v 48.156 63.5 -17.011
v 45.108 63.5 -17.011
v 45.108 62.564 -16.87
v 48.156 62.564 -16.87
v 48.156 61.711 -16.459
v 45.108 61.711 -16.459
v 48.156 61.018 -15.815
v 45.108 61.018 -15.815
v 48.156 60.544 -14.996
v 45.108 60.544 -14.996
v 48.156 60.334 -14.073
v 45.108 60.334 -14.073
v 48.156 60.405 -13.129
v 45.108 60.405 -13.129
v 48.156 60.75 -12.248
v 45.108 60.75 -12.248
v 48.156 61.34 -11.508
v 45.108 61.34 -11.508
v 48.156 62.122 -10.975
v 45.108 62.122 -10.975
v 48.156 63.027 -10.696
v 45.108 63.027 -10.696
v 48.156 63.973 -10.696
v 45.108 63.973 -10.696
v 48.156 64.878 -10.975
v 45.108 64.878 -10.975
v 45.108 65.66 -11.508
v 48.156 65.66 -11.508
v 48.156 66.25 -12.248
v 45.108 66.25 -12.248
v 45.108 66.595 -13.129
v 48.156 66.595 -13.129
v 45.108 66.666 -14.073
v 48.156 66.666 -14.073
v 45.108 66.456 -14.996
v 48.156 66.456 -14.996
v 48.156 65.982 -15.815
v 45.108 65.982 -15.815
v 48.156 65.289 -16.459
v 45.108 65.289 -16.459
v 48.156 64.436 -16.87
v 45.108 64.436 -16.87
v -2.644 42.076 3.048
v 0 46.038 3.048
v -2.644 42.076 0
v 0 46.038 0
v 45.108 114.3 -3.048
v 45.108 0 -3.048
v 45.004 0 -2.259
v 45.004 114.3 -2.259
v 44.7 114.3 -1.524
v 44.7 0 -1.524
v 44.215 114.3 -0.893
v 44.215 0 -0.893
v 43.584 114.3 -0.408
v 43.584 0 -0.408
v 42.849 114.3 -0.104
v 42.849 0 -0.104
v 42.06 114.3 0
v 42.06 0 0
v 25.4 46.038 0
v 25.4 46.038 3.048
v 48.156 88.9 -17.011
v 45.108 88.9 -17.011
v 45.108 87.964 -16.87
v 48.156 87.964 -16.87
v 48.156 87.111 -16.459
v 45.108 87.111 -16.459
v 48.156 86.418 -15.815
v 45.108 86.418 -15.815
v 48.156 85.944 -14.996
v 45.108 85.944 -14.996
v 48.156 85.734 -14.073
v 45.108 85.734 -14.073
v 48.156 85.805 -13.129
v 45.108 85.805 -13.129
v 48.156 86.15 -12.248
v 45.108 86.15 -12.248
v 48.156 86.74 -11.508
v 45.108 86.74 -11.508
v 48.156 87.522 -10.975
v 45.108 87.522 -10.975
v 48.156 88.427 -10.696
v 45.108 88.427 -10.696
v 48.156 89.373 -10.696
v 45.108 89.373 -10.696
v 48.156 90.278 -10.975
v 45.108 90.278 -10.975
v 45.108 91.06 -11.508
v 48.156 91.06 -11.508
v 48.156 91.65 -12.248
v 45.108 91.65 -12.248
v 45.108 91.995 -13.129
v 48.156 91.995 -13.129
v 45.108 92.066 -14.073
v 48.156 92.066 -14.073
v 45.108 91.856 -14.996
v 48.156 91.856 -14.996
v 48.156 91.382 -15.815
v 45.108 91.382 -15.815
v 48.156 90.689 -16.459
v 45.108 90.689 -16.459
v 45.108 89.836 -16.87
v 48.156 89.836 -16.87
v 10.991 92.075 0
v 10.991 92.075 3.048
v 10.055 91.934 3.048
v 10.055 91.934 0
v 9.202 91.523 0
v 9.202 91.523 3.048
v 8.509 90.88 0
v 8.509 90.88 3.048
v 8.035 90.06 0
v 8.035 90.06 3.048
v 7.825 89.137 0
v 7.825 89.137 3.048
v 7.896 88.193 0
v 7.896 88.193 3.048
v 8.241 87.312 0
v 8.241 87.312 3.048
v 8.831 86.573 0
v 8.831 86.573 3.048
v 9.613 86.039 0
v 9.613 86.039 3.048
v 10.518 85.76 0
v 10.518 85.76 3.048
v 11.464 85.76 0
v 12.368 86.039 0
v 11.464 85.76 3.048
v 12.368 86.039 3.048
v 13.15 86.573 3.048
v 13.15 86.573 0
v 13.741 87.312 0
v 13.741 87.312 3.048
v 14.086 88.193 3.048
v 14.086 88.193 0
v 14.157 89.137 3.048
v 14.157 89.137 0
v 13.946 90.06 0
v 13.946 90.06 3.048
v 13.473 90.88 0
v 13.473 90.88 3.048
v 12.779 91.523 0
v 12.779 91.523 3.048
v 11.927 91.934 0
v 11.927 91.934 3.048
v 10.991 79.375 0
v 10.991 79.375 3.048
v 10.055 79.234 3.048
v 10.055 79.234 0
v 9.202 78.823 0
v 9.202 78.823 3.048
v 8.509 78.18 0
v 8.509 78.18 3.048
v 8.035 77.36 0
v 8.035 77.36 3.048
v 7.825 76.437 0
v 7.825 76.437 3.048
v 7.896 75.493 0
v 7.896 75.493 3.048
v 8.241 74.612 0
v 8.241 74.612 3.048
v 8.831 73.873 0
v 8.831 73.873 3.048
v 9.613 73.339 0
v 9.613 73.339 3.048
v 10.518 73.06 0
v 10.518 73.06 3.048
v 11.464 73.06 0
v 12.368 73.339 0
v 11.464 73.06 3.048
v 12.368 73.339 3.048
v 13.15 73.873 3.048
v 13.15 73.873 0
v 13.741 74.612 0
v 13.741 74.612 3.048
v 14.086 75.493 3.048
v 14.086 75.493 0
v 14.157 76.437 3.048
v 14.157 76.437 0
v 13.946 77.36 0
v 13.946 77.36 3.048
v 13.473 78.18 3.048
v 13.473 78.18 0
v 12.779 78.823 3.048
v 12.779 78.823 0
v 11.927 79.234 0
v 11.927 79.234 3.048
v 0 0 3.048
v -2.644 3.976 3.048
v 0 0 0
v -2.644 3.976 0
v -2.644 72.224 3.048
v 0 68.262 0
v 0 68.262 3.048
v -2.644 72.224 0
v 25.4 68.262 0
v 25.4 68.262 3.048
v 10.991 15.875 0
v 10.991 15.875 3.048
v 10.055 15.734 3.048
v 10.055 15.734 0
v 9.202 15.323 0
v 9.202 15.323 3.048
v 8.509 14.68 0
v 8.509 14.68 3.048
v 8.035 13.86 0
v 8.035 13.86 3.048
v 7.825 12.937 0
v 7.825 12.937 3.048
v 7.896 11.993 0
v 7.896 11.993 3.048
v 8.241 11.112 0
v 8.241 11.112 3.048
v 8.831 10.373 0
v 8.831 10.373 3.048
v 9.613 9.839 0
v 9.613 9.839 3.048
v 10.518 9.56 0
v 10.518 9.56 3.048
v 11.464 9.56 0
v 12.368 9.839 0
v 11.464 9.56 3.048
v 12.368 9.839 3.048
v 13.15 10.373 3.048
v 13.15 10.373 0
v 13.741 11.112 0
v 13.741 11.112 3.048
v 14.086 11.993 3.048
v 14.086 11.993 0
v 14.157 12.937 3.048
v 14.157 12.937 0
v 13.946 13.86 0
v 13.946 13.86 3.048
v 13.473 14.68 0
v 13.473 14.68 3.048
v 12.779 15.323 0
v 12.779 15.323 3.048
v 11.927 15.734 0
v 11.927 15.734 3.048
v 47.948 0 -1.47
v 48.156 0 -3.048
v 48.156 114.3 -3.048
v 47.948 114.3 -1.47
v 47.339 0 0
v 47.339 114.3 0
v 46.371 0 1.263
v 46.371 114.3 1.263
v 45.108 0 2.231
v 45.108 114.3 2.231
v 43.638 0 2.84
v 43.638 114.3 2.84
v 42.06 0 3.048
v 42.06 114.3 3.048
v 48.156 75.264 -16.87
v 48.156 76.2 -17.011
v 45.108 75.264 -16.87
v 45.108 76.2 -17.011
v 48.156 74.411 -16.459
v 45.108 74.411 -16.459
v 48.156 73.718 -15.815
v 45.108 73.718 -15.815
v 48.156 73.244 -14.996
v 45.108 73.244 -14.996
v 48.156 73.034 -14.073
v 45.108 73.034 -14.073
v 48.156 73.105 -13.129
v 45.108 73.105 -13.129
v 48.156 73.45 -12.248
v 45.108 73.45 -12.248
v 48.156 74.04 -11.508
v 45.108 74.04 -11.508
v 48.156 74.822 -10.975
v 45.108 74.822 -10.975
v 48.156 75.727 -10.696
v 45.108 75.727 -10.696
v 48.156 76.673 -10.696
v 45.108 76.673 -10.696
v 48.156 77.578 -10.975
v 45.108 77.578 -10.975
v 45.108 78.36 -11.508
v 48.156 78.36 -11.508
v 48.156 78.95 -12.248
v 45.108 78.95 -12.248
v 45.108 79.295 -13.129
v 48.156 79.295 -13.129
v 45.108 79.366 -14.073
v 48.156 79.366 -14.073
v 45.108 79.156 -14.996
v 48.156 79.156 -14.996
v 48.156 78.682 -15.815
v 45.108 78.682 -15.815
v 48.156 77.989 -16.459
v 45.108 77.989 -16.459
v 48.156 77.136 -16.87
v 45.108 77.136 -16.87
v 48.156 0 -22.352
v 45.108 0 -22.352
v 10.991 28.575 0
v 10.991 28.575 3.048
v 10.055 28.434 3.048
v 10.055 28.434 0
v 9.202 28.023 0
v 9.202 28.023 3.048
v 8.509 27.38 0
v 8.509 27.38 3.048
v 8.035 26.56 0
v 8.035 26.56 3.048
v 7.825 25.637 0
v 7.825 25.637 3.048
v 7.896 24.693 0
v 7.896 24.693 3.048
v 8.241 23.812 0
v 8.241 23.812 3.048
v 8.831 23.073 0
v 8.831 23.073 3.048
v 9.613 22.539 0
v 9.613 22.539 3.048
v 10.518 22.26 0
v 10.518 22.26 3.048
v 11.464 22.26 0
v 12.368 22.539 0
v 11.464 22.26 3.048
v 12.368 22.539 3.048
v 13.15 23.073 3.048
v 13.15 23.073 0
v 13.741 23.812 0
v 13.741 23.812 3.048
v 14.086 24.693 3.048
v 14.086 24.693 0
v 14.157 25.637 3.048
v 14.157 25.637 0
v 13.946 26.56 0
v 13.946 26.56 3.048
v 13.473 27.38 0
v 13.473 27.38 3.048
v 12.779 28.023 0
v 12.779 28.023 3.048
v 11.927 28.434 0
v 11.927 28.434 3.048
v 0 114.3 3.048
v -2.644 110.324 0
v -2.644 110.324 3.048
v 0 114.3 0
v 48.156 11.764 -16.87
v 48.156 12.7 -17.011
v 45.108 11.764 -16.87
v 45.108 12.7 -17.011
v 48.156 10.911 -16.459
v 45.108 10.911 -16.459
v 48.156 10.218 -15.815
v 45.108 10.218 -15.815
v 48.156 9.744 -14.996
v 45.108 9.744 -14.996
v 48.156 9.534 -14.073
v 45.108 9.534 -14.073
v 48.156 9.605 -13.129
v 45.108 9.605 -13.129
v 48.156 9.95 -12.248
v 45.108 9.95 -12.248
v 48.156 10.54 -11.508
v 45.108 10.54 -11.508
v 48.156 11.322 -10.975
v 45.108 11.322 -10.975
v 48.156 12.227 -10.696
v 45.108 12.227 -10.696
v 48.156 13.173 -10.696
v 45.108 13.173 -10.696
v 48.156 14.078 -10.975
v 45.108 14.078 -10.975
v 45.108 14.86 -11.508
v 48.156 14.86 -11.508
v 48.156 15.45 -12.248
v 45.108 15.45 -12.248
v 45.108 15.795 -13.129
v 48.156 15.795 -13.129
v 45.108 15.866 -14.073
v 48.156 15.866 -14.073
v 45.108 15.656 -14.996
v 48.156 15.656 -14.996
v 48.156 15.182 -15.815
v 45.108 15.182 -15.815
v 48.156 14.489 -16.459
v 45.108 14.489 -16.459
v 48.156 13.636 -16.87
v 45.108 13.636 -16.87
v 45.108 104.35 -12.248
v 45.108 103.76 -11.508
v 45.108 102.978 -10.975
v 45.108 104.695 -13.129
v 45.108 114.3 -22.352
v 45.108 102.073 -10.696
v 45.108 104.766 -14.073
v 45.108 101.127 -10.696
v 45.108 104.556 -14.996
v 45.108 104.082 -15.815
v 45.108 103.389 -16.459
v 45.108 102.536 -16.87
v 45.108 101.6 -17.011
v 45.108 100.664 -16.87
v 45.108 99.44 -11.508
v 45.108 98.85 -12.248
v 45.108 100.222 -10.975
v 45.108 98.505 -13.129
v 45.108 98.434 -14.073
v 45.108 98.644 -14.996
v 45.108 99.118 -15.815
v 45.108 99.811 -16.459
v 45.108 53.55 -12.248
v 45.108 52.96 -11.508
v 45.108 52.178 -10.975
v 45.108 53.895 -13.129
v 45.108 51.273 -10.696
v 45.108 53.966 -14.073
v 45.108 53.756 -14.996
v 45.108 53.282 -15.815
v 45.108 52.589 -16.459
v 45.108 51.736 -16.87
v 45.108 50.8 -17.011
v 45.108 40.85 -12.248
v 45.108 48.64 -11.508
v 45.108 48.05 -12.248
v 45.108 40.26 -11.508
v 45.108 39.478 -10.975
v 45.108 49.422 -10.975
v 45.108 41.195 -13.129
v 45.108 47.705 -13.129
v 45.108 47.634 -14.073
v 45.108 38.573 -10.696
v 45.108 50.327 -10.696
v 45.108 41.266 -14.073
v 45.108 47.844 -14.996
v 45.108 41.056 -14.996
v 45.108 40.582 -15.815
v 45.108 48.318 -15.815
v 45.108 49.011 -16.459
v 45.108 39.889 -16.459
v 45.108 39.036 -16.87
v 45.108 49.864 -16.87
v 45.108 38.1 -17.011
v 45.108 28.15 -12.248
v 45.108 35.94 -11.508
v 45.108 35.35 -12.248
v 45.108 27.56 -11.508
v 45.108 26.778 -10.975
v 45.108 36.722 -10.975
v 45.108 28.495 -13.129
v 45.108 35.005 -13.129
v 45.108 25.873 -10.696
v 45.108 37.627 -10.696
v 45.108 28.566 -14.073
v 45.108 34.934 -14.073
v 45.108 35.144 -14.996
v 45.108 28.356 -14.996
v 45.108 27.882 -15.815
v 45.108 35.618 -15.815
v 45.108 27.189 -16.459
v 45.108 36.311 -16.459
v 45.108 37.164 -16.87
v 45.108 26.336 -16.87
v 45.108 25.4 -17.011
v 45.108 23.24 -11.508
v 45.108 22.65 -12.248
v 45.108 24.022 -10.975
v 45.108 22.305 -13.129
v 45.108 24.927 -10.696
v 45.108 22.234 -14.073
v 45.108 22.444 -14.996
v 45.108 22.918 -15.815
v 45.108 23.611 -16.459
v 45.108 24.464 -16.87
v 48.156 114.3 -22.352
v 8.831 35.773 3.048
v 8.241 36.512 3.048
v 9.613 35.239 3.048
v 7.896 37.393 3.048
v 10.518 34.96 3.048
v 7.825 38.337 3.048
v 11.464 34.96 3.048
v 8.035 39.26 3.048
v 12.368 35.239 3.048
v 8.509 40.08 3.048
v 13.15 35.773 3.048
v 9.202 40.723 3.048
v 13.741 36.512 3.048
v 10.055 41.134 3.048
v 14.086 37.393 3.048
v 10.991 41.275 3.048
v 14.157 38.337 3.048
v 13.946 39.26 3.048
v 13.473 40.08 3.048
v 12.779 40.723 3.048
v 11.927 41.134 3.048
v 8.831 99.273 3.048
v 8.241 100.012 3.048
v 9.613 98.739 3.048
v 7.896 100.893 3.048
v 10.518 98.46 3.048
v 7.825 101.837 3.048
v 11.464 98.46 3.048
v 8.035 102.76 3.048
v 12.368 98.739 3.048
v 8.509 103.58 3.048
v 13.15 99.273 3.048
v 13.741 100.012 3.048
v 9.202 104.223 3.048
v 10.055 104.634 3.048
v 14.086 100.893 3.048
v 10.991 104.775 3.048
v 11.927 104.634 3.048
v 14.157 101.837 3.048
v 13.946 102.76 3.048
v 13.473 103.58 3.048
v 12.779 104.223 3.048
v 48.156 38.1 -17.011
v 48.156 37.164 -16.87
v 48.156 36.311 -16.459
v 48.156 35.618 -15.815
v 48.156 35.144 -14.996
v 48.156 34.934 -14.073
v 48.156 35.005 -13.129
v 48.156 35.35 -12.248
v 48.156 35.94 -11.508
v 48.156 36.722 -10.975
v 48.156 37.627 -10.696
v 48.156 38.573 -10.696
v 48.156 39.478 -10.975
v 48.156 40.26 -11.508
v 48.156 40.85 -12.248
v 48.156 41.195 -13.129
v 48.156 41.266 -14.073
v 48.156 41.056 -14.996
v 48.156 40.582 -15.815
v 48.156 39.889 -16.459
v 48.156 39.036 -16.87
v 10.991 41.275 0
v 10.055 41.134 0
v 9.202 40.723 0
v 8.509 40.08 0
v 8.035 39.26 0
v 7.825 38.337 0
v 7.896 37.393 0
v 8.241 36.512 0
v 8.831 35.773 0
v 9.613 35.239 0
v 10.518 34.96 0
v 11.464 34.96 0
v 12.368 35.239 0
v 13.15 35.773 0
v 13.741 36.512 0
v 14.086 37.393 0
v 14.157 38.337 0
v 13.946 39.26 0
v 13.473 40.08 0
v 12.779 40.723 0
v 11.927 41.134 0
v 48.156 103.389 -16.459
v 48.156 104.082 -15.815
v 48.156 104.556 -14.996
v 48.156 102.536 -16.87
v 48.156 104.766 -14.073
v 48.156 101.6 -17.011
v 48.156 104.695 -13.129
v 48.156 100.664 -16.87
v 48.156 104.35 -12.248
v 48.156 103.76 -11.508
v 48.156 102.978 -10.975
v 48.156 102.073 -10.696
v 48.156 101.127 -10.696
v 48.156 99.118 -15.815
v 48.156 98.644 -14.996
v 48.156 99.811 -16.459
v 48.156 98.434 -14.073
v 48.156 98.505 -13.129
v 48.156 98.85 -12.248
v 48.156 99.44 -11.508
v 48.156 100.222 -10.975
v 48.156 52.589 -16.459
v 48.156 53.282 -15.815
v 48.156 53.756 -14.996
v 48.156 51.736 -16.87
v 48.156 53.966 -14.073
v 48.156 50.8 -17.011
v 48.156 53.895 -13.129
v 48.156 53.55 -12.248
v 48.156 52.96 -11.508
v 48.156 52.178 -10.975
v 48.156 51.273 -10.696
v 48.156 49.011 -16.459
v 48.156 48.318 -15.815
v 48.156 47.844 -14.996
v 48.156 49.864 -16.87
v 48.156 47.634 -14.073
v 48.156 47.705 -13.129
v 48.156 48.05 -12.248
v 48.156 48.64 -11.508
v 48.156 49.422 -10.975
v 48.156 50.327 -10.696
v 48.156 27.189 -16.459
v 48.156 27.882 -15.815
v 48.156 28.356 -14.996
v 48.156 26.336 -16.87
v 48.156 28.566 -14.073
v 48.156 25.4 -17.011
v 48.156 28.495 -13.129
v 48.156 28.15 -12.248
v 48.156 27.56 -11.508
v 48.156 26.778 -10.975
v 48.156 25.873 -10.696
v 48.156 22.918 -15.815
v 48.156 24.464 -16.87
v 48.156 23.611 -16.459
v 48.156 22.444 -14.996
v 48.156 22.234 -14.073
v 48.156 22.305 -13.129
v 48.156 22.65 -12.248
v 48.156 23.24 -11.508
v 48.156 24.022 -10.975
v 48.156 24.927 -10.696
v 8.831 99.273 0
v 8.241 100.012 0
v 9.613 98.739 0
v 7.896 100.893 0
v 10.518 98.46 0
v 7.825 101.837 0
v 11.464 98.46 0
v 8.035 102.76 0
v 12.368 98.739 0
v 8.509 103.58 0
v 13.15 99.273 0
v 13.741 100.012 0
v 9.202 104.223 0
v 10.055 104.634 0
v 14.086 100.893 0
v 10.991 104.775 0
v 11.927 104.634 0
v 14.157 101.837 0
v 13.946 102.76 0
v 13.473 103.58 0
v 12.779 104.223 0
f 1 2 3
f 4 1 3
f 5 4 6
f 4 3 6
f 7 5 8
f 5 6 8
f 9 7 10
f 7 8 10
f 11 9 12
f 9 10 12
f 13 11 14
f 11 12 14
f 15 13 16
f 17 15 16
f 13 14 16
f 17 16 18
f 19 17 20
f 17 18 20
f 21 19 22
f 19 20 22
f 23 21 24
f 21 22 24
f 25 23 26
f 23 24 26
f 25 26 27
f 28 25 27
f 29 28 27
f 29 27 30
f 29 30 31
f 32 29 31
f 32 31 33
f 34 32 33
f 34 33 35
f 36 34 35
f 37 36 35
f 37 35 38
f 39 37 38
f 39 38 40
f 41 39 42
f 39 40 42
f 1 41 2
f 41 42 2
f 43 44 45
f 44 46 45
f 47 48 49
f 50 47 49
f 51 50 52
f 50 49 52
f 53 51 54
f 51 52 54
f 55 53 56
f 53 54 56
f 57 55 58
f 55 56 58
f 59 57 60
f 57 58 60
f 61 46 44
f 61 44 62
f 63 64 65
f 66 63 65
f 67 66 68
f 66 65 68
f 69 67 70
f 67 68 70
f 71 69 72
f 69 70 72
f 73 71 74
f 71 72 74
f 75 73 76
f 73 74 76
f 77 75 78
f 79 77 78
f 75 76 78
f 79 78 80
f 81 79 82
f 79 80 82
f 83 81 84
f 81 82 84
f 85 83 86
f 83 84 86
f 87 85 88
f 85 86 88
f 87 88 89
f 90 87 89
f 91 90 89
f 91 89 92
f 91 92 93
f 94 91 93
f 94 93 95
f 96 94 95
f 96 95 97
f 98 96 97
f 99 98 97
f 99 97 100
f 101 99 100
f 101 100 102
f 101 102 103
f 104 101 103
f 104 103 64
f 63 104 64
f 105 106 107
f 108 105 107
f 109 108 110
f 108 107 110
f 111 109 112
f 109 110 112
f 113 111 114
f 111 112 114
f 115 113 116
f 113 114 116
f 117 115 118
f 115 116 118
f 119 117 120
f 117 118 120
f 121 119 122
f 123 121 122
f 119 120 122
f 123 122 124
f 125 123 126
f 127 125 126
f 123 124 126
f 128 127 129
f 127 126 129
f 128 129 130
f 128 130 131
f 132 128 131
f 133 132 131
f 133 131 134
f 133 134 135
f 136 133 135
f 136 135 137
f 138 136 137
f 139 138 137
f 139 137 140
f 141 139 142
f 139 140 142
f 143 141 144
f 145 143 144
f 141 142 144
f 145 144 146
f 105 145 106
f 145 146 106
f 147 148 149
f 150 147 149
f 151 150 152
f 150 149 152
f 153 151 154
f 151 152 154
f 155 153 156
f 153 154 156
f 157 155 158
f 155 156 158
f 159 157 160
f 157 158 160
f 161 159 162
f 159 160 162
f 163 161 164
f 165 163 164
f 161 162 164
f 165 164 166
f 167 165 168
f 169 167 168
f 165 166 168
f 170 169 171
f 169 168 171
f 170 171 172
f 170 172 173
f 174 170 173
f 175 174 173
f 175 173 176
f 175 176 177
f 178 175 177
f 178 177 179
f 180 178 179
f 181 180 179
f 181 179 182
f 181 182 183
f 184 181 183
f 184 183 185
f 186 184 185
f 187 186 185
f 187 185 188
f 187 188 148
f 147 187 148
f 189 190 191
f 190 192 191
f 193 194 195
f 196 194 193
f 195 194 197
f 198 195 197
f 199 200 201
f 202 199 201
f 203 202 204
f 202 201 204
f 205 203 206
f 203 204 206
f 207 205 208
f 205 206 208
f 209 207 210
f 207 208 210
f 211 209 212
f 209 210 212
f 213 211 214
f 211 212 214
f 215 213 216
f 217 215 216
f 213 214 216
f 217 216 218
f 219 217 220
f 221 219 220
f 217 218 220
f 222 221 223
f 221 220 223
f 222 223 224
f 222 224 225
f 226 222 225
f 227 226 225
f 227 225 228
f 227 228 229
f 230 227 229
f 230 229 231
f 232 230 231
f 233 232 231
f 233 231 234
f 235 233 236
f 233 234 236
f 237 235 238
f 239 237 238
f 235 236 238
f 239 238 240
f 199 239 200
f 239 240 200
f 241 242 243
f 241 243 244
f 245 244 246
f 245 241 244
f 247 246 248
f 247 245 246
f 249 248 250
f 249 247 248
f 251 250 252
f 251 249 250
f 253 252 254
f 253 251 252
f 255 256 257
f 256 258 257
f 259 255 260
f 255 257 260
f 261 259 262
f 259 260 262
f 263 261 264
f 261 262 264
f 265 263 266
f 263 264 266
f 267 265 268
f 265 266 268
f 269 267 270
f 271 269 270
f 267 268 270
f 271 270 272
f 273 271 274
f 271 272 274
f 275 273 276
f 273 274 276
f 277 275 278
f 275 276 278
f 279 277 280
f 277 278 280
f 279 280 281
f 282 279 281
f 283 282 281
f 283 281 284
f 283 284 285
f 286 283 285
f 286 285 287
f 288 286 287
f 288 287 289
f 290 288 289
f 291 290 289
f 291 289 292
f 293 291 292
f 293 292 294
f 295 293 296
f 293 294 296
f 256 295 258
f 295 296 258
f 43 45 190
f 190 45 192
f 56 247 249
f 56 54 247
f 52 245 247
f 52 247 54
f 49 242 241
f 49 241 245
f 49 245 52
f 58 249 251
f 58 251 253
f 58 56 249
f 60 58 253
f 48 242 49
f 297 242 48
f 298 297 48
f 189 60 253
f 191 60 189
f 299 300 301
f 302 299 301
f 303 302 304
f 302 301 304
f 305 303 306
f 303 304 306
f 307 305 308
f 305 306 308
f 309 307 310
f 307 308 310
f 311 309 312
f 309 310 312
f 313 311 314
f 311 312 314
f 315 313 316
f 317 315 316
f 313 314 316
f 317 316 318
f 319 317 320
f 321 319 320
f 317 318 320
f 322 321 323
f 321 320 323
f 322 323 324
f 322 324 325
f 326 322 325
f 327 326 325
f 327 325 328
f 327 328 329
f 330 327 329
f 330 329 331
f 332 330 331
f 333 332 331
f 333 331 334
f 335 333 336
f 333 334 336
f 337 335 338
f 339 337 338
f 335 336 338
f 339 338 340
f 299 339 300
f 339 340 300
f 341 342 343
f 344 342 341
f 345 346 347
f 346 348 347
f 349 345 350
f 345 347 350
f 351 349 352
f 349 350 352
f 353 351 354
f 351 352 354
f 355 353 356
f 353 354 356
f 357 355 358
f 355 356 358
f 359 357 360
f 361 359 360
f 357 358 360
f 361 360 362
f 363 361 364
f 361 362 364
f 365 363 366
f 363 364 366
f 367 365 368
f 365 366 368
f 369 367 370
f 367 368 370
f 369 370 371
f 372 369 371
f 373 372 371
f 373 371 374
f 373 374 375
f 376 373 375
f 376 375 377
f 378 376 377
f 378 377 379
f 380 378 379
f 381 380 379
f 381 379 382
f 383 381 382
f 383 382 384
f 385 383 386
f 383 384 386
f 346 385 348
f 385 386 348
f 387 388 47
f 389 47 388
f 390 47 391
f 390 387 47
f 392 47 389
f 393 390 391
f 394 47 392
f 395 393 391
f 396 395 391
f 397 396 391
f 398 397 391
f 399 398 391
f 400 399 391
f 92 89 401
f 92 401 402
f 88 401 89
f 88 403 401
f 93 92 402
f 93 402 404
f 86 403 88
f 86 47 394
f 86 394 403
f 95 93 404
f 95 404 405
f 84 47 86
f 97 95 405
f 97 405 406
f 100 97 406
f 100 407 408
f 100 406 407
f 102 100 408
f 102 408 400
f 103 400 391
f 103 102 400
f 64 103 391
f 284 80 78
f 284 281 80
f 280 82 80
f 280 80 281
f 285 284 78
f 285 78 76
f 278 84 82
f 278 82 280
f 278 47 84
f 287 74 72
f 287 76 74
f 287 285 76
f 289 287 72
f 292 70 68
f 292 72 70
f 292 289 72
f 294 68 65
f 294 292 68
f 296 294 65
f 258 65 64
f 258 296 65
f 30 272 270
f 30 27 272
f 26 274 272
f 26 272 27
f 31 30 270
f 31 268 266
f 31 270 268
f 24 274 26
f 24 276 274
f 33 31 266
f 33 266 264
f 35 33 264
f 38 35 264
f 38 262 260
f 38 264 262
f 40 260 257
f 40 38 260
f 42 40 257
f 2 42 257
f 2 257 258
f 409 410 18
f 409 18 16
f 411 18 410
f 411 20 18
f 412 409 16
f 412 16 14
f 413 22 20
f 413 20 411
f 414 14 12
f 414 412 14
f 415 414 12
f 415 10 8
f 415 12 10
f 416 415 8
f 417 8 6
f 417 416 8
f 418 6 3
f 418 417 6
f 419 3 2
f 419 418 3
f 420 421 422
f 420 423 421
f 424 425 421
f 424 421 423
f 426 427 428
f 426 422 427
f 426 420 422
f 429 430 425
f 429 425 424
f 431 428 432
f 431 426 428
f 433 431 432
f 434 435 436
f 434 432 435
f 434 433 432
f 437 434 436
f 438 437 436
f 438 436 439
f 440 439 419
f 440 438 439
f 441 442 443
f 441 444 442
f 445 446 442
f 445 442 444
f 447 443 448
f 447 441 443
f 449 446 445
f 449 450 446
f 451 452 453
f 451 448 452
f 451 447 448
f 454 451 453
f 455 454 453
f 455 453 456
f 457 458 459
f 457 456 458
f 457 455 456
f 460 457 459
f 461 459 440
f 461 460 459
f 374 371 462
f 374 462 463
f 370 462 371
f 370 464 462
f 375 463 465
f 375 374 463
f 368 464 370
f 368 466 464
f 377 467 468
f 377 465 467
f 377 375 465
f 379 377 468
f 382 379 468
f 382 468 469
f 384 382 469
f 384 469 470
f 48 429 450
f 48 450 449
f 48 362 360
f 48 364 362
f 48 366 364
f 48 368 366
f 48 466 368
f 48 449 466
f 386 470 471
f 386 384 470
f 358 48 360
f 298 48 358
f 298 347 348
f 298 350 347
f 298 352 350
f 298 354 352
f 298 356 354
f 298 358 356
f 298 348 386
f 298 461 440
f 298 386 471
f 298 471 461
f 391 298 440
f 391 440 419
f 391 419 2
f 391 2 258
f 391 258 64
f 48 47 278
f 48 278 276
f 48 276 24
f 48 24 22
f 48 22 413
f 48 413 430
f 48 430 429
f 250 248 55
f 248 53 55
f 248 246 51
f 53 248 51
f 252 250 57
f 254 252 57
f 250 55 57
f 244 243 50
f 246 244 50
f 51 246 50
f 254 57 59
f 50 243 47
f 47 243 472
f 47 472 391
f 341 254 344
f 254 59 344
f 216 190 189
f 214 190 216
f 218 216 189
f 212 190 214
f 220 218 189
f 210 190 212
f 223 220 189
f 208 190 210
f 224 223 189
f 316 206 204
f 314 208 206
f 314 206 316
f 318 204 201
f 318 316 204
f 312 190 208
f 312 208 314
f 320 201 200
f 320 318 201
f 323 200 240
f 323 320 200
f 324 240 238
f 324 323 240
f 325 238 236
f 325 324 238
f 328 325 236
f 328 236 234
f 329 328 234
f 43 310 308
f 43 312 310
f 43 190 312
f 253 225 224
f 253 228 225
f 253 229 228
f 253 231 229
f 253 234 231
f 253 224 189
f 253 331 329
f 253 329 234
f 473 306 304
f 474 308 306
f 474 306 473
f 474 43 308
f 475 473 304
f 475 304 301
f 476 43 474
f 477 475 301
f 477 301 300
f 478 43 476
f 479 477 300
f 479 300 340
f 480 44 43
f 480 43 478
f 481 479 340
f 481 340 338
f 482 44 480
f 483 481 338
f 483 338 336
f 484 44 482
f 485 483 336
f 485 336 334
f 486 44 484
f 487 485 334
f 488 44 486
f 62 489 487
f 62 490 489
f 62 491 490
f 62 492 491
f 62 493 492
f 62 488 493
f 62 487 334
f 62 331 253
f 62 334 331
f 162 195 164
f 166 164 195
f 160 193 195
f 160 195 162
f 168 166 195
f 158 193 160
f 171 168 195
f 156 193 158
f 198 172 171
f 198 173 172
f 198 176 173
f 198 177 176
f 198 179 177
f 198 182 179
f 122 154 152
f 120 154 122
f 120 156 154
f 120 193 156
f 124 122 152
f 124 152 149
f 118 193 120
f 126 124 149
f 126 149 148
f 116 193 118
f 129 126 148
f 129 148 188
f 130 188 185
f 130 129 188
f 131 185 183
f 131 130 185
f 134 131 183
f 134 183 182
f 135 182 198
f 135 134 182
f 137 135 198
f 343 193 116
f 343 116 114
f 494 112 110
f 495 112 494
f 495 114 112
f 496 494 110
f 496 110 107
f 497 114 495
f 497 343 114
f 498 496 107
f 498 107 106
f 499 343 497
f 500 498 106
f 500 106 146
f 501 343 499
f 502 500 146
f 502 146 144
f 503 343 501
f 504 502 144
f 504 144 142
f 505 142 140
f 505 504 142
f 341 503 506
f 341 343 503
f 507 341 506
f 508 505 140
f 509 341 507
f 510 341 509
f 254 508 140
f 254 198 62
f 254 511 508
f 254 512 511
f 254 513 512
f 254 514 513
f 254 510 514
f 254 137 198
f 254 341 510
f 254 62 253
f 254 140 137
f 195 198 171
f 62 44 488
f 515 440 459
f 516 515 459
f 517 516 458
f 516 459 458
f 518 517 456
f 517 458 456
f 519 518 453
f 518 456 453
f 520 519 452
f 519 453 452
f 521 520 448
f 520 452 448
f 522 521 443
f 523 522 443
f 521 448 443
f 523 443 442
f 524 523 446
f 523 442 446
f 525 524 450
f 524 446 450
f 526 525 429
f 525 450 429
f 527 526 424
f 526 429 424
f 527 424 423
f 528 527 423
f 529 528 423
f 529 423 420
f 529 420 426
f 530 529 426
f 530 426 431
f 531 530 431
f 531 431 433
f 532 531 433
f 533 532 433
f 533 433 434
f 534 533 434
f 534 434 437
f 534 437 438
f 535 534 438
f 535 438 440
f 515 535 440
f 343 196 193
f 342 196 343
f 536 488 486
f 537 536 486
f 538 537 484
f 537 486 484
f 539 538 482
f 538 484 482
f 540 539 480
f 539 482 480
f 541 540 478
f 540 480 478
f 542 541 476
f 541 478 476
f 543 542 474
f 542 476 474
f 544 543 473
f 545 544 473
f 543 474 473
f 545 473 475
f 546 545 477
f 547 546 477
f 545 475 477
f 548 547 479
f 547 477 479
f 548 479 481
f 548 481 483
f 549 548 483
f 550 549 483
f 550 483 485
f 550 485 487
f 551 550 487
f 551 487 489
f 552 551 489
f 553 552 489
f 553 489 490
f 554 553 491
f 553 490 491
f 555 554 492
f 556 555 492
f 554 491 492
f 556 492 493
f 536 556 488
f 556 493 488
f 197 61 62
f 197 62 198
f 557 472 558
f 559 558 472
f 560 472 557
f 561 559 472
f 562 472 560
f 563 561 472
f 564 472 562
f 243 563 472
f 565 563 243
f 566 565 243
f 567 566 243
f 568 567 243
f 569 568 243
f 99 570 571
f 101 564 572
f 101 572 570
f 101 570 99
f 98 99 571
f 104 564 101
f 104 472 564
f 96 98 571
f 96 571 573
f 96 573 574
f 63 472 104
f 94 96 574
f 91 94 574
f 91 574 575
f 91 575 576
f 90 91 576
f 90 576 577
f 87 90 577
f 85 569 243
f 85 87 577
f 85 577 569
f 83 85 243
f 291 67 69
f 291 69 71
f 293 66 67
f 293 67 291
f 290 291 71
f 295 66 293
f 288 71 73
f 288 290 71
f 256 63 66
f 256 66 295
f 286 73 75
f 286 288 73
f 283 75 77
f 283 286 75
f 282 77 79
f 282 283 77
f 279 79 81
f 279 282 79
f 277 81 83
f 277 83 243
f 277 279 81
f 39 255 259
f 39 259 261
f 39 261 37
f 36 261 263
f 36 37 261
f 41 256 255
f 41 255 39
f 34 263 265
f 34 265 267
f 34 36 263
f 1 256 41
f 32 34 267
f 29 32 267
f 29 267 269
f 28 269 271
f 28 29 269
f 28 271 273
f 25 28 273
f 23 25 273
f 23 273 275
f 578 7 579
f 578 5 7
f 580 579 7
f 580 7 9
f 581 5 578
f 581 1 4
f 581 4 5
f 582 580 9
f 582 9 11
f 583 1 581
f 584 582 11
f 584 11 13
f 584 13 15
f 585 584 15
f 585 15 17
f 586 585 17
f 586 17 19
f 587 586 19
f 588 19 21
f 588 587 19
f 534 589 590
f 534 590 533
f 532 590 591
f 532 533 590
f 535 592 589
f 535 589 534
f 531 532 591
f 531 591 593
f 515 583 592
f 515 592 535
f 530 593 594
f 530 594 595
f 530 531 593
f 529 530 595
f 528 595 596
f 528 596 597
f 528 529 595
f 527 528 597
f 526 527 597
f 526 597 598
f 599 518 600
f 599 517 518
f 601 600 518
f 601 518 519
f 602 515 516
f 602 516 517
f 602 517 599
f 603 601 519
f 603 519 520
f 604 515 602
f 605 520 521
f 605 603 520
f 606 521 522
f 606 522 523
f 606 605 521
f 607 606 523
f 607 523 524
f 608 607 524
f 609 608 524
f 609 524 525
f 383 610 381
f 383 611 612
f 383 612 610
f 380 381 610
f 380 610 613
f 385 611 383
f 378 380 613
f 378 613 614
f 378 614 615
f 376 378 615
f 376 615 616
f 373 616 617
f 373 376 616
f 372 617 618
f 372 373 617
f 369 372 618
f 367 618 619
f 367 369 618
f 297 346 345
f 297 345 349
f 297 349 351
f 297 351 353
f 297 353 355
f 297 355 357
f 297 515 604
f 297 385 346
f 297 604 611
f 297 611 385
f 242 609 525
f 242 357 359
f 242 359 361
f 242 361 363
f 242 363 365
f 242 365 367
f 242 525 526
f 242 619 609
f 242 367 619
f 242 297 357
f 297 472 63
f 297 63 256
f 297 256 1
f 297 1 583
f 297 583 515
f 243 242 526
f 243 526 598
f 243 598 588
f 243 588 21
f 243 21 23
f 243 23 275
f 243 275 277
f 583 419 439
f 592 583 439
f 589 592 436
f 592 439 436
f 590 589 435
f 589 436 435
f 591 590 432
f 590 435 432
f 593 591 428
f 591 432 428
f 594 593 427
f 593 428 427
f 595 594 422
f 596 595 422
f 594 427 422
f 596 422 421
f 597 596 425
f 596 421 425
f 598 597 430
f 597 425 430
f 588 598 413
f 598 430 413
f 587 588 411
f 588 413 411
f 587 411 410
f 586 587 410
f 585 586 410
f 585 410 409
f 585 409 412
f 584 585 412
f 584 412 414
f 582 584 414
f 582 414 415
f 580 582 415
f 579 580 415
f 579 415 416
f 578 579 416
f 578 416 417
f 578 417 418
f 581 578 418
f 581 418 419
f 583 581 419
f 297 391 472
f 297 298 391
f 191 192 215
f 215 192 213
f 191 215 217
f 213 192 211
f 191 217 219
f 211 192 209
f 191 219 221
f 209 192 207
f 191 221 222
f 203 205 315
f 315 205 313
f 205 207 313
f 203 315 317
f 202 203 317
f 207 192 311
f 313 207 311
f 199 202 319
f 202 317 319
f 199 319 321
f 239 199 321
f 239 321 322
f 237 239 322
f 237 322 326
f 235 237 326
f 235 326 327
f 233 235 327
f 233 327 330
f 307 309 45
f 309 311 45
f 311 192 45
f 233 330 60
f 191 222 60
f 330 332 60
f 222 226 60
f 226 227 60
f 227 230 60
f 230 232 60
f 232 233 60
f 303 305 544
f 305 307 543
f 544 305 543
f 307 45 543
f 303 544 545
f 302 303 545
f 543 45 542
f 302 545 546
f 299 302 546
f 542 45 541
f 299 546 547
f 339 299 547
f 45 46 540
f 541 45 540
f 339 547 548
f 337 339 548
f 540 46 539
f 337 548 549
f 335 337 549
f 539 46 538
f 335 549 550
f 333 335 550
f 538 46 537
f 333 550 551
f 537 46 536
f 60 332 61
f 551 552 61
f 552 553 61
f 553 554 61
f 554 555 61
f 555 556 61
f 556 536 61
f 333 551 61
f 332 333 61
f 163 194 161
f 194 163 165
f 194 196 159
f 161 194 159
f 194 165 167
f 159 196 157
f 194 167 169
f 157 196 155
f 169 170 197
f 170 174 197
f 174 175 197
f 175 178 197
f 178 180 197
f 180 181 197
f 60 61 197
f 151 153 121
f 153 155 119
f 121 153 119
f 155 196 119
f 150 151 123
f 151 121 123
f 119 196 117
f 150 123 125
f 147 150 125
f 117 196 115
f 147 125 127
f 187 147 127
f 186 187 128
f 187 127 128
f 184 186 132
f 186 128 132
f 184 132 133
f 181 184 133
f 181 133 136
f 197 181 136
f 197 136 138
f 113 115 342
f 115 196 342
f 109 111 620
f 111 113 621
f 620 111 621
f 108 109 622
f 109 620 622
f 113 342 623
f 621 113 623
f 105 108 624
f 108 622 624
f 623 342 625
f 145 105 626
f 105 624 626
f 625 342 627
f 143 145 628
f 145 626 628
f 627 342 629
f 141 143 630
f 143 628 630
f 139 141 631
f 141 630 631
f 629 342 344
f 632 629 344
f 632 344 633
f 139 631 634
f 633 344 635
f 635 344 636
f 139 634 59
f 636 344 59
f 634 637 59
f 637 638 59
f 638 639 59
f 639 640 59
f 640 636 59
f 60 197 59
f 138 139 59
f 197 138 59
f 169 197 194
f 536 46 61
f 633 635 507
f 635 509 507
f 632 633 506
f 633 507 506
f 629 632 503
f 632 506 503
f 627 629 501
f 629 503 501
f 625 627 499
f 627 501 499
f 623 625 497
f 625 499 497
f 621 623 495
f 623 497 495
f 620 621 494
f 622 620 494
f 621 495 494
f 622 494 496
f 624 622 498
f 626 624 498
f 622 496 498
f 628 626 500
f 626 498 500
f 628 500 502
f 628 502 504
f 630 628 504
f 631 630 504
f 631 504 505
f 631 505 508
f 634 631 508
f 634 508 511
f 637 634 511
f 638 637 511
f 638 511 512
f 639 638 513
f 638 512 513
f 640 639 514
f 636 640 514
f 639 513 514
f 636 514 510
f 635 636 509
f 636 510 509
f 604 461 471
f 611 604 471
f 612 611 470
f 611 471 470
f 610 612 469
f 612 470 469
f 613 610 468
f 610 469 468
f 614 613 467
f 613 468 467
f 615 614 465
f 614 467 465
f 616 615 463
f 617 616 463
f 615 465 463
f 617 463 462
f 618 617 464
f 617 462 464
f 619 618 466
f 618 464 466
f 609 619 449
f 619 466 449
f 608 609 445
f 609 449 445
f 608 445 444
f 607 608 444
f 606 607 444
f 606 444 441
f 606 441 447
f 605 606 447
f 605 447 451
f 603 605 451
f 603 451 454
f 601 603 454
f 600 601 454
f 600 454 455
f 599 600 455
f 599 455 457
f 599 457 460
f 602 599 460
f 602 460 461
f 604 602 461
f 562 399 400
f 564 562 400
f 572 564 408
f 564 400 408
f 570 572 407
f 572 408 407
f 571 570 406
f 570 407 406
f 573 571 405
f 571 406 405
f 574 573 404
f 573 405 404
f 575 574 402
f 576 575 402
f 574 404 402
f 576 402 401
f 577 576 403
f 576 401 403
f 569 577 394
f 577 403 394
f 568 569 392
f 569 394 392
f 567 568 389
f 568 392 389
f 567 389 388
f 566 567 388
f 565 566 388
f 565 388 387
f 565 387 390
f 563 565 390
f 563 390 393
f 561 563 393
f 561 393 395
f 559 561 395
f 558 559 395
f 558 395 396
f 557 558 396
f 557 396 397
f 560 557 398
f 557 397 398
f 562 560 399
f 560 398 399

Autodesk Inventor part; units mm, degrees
ref_plane "YZ Plane" through (0, 0, 0) normal (1, 0, 0) x (0, 1, 0)
ref_plane "XZ Plane" through (0, 0, 0) normal (0, 1, 0) x (-1, 0, 0)
ref_plane "XY Plane" through (0, 0, 0) normal (0, 0, 1) x (1, 0, 0)
sketch "Sketch1" plane through (0, 0, 0) normal (0, 0, 1) x (1, 0, 0)
  line L0 (0, 46.0375) -> (-2.644, 42.0764)
  line L1 (-2.644, 42.0764) -> (-2.644, 3.9764)
  line L2 (-2.644, 3.9764) -> (0, 0)
  line L3 (0, 46.0375) -> (25.4, 46.0375)
  line L4 (25.4, 46.0375) -> (25.4, 68.2625)
  line L5 (25.4, 57.15) -> (26.8908, 57.15)
  line L6 (0, 68.2625) -> (-2.644, 72.2236)
  line L7 (-2.644, 72.2236) -> (-2.644, 110.3236)
  line L8 (-2.644, 110.3236) -> (0, 114.3)
  line L9 (0, 68.2625) -> (25.4, 68.2625)
  line L10 (25.4, 68.2625) -> (25.4, 46.0375)
  line L11 (48.156, 114.3) -> (0, 114.3)
  line L12 (48.156, 114.3) -> (48.156, 0)
  line L13 (0, 0) -> (48.156, 0)
  line L14 (218.3648, 132.2525) -> (215.7208, 128.2914)
  line L15 (215.7208, 128.2914) -> (215.7208, 90.1914)
  line L16 (215.7208, 90.1914) -> (218.3648, 86.215)
  line L17 (218.3648, 132.2525) -> (234.2398, 132.2525)
  line L18 (218.3648, 154.4775) -> (215.7208, 158.4387)
  line L19 (215.7208, 158.4387) -> (215.7208, 196.5387)
  line L20 (215.7208, 196.5387) -> (218.3648, 200.515)
  line L21 (218.3648, 154.4775) -> (234.2398, 154.4775)
  line L22 (253.8208, 200.515) -> (218.3648, 200.515)
  line L23 (253.8208, 200.515) -> (253.8208, 86.215)
  line L24 (218.3648, 86.215) -> (253.8208, 86.215)
  line L25 (379.0105, 160.3375) -> (376.3665, 156.3764)
  line L26 (376.3665, 156.3764) -> (376.3665, 118.2764)
  line L27 (376.3665, 118.2764) -> (379.0105, 114.3)
  line L28 (379.0105, 160.3375) -> (398.0605, 160.3375)
  line L29 (398.0605, 160.3375) -> (398.0605, 182.5625)
  line L30 (398.0605, 171.45) -> (393.2013, 171.45)
  line L31 (379.0105, 182.5625) -> (376.3665, 186.5236)
  line L32 (376.3665, 186.5236) -> (376.3665, 224.6236)
  line L33 (376.3665, 224.6236) -> (379.0105, 228.6)
  line L34 (379.0105, 182.5625) -> (398.0605, 182.5625)
  line L35 (398.0605, 182.5625) -> (398.0605, 160.3375)
  line L36 (414.4665, 228.6) -> (379.0105, 228.6)
  line L37 (414.4665, 228.6) -> (414.4665, 114.3)
  line L38 (379.0105, 114.3) -> (414.4665, 114.3)
  line L39 (237.4148, 151.3025) -> (237.4148, 135.4275)
  arc A0 (237.4148, 151.3025) -> (234.2398, 154.4775) centre (234.2398, 151.3025) ccw
  arc A1 (234.2398, 132.2525) -> (237.4148, 135.4275) centre (234.2398, 135.4275) ccw
  line L40 (0, 114.3) -> (48.156, 114.3)
  line L41 (48.156, 114.3) -> (48.156, 0)
  line L42 (48.156, 0) -> (0, 0)
  line L43 (0, 0) -> (-2.644, 3.9764)
  line L44 (-2.644, 3.9764) -> (-2.644, 42.0764)
  line L45 (-2.644, 42.0764) -> (0, 46.0375)
  line L46 (0, 46.0375) -> (25.4, 46.0375)
  line L47 (25.4, 46.0375) -> (25.4, 68.2625)
  line L48 (25.4, 68.2625) -> (0, 68.2625)
  line L49 (0, 68.2625) -> (-2.644, 72.2236)
  line L50 (-2.644, 72.2236) -> (-2.644, 110.3236)
  line L51 (-2.644, 110.3236) -> (0, 114.3)
  dimension "d1" = 46.0375
  dimension "d5" = 38.1
  dimension "d6" = 4.7625
  dimension "d8" = 4.7752
  dimension "d9" = 25.4
  dimension "d12" = 22.225
  dimension "d14" = 114.3
  dimension "d15" = 22.756
  dimension "d16" = 21.2652
  dimension "d26" = 46.0375
  dimension "d27" = 38.1
  dimension "d28" = 4.7625
  dimension "d29" = 4.7752
  dimension "d30" = 19.05
  dimension "d31" = 22.225
  dimension "d32" = 114.3
  dimension "d33" = 16.406
  dimension "d34" = 21.2652
  dimension "d35" = 3.175
extrude "Plate1" add sketch "Sketch1" along normal blind 3.048 contours L3 L4 L9 L6 L7 L8 L11 L12 L13 L2 L1 L0
sketch "Sketch5" plane through (45.108, 0, 3.048) normal (1, 0, 0) x (0, 1, 0)
  line L0 (114.3, 0) -> (0, 0)
  line L1 (0, 0) -> (0, -25.4)
  line L2 (0, -25.4) -> (114.3, -25.4)
  line L3 (114.3, -25.4) -> (114.3, 0)
edge flange "Flange1" height 25.4 angle 90 thickness 3.048 bend radius 3.048 thickness toward (1, 0, 0) relief tear relief width 3.048 relief depth 1.524 edges at (48.156, 57.15, 0) wall of the first edge with corners at (45.108, 114.3, 3.048) (45.108, 0, 3.048) (45.108, 0, -22.352) (45.108, 114.3, -22.352)
bend "Bend2"
corner "Corner1"
sketch "Sketch6" plane through (0, 0, 0) normal (0, 0, -1) x (-1, 0, 0)
  line L0 (0, 114.3) -> (-42.06, 114.3) projected
  line L1 (0, 0) -> (-42.06, 0) projected
  point P0 (-10.9909, 101.6)
  point P1 (-10.9909, 88.9)
  point P2 (-10.9909, 76.2)
  point P3 (-10.9909, 38.1)
  point P4 (-10.9909, 25.4)
  point P5 (-10.9909, 12.7)
  dimension "d91" = 12.7
  dimension "d92" = 12.7
  dimension "d93" = 12.7
  dimension "d94" = 12.7
  dimension "d95" = 12.7
  dimension "d96" = 12.7
hole "Hole3" at (10.9909, 101.6, 0) at (10.9909, 88.9, 0) at (10.9909, 76.2, 0) at (10.9909, 38.1, 0) at (10.9909, 25.4, 0) at (10.9909, 12.7, 0) direction (0, 0, 1) diameter 6.35 depth 3.048 tip angle 118
sketch "Sketch7" plane through (48.156, 0, -22.352) normal (1, 0, 0) x (0, 0, -1)
  line L0 (0, 0) -> (-19.304, 0) projected
  point P0 (-22.352, 0)
  point P1 (-8.5162, 101.6)
  point P2 (-8.5162, 88.9)
  point P3 (-8.5162, 76.2)
  point P4 (-8.5162, 63.5)
  point P5 (-8.5162, 50.8)
  point P6 (-8.5162, 38.1)
  point P7 (-8.5162, 25.4)
  point P8 (-8.5162, 12.7)
  dimension "d104" = 12.7
  dimension "d105" = 12.7
  dimension "d106" = 12.7
  dimension "d107" = 12.7
  dimension "d108" = 12.7
  dimension "d109" = 12.7
  dimension "d110" = 12.7
  dimension "d111" = 12.7
hole "Hole4" at (48.156, 88.9, -13.8358) at (48.156, 101.6, -13.8358) at (48.156, 76.2, -13.8358) at (48.156, 63.5, -13.8358) at (48.156, 50.8, -13.8358) at (48.156, 25.4, -13.8358) at (48.156, 38.1, -13.8358) at (48.156, 12.7, -13.8358) direction (-1, 0, 0) diameter 6.35 depth 3.048 tip angle 118
equation "\"d92\" = d91"
equation "\"d93\" = d91"
equation "\"d94\" = d91"
equation "\"d95\" = d91"
equation "\"d96\" = d91"
equation "\"d102\" = Thickness"
equation "\"d105\" = d104"
equation "\"d106\" = d104"
equation "\"d107\" = d104"
equation "\"d108\" = d104"
equation "\"d109\" = d104"
equation "\"d110\" = d104"
equation "\"d111\" = d104"
equation "\"d117\" = Thickness"
equation "\"d81\" = BendReliefWidth"
equation "\"d82\" = BendReliefDepth"
equation "\"d83\" = MinimumRemnant"
equation "\"d84\" = BendRadius"
equation "\"d87\" = BendRadius"
equation "\"d88\" = CornerReliefSize"
equation "\"d89\" = GapSize"
equation "\"d90\" = JacobiRadiusSize"
equation "\"BendRadius\" = Thickness"
equation "\"BendReliefWidth\" = Thickness"
equation "\"BendReliefDepth\" = 0.5 * Thickness"
equation "\"CornerReliefSize\" = 4 * Thickness"
equation "\"MinimumRemnant\" = 2 * Thickness"
equation "\"TransitionRadius\" = BendRadius"
equation "\"JacobiRadiusSize\" = BendRadius"
equation "\"GapSize\" = Thickness"
equation "\"d36\" = BendRadius"
equation "\"Thickness\" = 3.048"
properties part number "Transmission bracket"
